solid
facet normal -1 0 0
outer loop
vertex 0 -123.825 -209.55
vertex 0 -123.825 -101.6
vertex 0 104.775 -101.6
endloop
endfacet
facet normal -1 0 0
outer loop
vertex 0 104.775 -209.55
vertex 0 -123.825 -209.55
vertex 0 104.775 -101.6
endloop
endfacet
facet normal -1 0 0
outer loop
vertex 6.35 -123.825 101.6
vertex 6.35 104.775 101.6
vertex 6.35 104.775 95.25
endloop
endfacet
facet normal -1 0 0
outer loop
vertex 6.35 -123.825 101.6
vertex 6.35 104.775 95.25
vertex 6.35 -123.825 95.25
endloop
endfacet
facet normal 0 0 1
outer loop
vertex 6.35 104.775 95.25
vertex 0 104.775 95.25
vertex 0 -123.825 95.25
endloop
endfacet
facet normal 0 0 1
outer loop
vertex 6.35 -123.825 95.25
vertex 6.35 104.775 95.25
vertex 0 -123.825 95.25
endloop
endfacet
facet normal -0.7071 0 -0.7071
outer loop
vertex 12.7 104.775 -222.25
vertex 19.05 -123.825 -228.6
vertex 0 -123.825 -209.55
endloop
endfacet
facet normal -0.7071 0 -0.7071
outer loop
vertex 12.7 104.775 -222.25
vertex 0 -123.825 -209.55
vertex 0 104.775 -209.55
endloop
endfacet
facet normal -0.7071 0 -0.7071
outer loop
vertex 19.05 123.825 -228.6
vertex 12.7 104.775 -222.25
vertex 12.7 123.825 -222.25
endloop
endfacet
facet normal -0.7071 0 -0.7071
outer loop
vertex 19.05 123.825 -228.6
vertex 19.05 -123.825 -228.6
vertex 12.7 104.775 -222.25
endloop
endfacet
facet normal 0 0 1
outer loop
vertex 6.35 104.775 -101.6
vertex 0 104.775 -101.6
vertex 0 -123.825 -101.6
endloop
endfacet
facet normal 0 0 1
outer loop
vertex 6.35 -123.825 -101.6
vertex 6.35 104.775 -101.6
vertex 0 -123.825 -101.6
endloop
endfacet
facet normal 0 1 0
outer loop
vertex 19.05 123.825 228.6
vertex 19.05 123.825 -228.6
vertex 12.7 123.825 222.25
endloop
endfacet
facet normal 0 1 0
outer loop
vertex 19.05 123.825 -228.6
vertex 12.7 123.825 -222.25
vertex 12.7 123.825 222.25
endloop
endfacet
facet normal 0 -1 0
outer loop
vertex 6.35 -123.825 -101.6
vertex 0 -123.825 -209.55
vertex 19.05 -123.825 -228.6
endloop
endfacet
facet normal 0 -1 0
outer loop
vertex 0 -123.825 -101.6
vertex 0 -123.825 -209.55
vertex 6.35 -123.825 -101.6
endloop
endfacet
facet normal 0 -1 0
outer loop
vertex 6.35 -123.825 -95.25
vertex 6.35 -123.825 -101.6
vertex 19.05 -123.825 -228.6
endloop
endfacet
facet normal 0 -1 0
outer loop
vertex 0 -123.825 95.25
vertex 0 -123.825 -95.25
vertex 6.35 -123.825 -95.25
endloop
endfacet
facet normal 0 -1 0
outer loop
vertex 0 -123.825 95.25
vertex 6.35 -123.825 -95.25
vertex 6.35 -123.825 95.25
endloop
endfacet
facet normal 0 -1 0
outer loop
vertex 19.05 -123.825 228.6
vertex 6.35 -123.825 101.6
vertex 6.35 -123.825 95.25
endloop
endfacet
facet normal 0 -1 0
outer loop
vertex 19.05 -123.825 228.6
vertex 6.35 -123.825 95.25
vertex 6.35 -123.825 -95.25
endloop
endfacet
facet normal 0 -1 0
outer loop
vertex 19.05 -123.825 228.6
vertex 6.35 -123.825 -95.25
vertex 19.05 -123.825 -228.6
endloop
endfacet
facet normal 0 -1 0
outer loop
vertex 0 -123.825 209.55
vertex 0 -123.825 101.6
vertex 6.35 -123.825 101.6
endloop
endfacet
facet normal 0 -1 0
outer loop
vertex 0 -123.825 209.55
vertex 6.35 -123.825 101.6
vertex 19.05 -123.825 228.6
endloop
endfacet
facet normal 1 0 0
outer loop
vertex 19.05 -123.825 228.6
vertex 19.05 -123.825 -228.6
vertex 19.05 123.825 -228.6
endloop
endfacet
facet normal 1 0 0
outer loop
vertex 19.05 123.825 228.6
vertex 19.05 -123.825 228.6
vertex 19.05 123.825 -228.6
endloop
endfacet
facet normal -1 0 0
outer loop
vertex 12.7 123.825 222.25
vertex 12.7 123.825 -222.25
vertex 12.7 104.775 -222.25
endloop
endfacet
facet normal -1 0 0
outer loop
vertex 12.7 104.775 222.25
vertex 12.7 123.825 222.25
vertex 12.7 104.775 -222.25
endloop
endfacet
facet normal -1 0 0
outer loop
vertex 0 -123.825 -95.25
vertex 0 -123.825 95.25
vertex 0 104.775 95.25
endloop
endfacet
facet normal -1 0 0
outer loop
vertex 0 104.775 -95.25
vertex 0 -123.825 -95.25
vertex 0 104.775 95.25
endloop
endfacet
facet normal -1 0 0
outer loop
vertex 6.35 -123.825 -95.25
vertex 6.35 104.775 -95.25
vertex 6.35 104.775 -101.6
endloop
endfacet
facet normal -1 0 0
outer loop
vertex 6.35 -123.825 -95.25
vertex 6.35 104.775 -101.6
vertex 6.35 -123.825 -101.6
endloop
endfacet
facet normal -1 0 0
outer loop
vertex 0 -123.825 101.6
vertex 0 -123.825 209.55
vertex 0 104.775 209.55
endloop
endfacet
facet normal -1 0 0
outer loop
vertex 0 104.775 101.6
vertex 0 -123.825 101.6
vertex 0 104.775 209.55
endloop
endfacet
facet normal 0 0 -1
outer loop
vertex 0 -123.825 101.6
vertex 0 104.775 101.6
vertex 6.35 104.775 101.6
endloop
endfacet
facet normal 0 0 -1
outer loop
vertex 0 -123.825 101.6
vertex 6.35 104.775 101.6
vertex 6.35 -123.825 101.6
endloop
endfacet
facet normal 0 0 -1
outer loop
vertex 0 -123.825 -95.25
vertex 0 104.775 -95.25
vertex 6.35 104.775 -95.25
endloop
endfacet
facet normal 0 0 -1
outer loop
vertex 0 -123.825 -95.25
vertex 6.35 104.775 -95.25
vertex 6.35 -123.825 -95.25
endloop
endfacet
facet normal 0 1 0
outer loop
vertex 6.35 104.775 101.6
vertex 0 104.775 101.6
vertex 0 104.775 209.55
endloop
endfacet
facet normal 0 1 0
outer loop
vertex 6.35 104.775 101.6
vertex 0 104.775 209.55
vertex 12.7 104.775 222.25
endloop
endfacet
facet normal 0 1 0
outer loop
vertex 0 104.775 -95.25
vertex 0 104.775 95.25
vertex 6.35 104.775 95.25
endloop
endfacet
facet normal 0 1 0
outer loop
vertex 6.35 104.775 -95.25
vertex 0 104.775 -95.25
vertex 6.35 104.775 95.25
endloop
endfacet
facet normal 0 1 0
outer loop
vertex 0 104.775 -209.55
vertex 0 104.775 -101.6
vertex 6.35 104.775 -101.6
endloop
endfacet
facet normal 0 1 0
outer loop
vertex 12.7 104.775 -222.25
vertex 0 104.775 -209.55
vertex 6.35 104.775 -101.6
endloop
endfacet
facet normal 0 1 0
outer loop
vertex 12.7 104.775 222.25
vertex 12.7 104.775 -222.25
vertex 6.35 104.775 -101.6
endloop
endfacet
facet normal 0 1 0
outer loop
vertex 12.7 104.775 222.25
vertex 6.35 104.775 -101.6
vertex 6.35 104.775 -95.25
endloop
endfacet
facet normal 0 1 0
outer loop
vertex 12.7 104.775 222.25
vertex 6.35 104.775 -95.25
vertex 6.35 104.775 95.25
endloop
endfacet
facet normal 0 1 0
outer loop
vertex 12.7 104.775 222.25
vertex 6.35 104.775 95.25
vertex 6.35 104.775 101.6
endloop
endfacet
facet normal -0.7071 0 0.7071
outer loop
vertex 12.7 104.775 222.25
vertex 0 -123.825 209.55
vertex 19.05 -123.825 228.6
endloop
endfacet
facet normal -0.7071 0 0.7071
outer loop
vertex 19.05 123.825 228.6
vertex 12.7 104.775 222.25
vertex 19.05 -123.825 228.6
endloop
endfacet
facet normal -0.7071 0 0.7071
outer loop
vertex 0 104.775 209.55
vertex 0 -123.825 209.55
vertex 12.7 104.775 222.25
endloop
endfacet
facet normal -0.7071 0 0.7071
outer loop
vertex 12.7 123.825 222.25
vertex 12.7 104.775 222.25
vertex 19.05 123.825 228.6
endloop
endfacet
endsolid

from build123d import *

# Parameters (mm, degrees)
F0_W     = 247.65
F0_H     = 457.2
F1_DEPTH = 19.05
F2_W     = 12.7
F2_H     = 19.05
F3_DEPTH = 457.201
F4_SIZE  = 19.04999
F5_SIZE  = 19.04999
F6_W     = 228.6
F6_H     = 6.35
F7_DEPTH = 6.35


# Not quite as in the source:
# - a fillet or chamfer is up to 0.001 mm smaller than in the source, because OpenCascade refuses the exact size


with BuildPart() as f1:
    # F0 (on Right) → F1 (new body)
    with BuildSketch(Plane.YZ):
        Rectangle(F0_W, F0_H)
    extrude(amount=F1_DEPTH)

    # F2 (on face) → F3 (cut, through all)
    with BuildSketch(Plane(origin=(0, 0, -228.6), x_dir=(1, 0, 0), z_dir=(0, 0, -1))):
        with Locations((6.35, -114.3)):
            Rectangle(F2_W, F2_H)
    extrude(amount=-F3_DEPTH, mode=Mode.SUBTRACT)

    # F4 (size 19.05 in the source; OpenCascade refuses exactly that, so slightly less here)
    f4_edges = [f1.edges().sort_by_distance(p)[0] for p in [
        (0, -9.525, 228.6),
    ]]
    chamfer(f4_edges, length=F4_SIZE)

    # F5 (size 19.05 in the source; OpenCascade refuses exactly that, so slightly less here)
    f5_edges = [f1.edges().sort_by_distance(p)[0] for p in [
        (0, -9.525, -228.6),
    ]]
    chamfer(f5_edges, length=F5_SIZE)

    # F6 (on face) → F7 (cut)
    with BuildSketch(Plane(origin=(0, 0, 0), x_dir=(0, -1, 0), z_dir=(-1, 0, 0))):
        with Locations((9.525, -98.425)):
            Rectangle(F6_W, F6_H)
        with Locations((9.525, 98.425)):
            Rectangle(F6_W, F6_H)
    extrude(amount=-F7_DEPTH, mode=Mode.SUBTRACT)


solid = f1.part
